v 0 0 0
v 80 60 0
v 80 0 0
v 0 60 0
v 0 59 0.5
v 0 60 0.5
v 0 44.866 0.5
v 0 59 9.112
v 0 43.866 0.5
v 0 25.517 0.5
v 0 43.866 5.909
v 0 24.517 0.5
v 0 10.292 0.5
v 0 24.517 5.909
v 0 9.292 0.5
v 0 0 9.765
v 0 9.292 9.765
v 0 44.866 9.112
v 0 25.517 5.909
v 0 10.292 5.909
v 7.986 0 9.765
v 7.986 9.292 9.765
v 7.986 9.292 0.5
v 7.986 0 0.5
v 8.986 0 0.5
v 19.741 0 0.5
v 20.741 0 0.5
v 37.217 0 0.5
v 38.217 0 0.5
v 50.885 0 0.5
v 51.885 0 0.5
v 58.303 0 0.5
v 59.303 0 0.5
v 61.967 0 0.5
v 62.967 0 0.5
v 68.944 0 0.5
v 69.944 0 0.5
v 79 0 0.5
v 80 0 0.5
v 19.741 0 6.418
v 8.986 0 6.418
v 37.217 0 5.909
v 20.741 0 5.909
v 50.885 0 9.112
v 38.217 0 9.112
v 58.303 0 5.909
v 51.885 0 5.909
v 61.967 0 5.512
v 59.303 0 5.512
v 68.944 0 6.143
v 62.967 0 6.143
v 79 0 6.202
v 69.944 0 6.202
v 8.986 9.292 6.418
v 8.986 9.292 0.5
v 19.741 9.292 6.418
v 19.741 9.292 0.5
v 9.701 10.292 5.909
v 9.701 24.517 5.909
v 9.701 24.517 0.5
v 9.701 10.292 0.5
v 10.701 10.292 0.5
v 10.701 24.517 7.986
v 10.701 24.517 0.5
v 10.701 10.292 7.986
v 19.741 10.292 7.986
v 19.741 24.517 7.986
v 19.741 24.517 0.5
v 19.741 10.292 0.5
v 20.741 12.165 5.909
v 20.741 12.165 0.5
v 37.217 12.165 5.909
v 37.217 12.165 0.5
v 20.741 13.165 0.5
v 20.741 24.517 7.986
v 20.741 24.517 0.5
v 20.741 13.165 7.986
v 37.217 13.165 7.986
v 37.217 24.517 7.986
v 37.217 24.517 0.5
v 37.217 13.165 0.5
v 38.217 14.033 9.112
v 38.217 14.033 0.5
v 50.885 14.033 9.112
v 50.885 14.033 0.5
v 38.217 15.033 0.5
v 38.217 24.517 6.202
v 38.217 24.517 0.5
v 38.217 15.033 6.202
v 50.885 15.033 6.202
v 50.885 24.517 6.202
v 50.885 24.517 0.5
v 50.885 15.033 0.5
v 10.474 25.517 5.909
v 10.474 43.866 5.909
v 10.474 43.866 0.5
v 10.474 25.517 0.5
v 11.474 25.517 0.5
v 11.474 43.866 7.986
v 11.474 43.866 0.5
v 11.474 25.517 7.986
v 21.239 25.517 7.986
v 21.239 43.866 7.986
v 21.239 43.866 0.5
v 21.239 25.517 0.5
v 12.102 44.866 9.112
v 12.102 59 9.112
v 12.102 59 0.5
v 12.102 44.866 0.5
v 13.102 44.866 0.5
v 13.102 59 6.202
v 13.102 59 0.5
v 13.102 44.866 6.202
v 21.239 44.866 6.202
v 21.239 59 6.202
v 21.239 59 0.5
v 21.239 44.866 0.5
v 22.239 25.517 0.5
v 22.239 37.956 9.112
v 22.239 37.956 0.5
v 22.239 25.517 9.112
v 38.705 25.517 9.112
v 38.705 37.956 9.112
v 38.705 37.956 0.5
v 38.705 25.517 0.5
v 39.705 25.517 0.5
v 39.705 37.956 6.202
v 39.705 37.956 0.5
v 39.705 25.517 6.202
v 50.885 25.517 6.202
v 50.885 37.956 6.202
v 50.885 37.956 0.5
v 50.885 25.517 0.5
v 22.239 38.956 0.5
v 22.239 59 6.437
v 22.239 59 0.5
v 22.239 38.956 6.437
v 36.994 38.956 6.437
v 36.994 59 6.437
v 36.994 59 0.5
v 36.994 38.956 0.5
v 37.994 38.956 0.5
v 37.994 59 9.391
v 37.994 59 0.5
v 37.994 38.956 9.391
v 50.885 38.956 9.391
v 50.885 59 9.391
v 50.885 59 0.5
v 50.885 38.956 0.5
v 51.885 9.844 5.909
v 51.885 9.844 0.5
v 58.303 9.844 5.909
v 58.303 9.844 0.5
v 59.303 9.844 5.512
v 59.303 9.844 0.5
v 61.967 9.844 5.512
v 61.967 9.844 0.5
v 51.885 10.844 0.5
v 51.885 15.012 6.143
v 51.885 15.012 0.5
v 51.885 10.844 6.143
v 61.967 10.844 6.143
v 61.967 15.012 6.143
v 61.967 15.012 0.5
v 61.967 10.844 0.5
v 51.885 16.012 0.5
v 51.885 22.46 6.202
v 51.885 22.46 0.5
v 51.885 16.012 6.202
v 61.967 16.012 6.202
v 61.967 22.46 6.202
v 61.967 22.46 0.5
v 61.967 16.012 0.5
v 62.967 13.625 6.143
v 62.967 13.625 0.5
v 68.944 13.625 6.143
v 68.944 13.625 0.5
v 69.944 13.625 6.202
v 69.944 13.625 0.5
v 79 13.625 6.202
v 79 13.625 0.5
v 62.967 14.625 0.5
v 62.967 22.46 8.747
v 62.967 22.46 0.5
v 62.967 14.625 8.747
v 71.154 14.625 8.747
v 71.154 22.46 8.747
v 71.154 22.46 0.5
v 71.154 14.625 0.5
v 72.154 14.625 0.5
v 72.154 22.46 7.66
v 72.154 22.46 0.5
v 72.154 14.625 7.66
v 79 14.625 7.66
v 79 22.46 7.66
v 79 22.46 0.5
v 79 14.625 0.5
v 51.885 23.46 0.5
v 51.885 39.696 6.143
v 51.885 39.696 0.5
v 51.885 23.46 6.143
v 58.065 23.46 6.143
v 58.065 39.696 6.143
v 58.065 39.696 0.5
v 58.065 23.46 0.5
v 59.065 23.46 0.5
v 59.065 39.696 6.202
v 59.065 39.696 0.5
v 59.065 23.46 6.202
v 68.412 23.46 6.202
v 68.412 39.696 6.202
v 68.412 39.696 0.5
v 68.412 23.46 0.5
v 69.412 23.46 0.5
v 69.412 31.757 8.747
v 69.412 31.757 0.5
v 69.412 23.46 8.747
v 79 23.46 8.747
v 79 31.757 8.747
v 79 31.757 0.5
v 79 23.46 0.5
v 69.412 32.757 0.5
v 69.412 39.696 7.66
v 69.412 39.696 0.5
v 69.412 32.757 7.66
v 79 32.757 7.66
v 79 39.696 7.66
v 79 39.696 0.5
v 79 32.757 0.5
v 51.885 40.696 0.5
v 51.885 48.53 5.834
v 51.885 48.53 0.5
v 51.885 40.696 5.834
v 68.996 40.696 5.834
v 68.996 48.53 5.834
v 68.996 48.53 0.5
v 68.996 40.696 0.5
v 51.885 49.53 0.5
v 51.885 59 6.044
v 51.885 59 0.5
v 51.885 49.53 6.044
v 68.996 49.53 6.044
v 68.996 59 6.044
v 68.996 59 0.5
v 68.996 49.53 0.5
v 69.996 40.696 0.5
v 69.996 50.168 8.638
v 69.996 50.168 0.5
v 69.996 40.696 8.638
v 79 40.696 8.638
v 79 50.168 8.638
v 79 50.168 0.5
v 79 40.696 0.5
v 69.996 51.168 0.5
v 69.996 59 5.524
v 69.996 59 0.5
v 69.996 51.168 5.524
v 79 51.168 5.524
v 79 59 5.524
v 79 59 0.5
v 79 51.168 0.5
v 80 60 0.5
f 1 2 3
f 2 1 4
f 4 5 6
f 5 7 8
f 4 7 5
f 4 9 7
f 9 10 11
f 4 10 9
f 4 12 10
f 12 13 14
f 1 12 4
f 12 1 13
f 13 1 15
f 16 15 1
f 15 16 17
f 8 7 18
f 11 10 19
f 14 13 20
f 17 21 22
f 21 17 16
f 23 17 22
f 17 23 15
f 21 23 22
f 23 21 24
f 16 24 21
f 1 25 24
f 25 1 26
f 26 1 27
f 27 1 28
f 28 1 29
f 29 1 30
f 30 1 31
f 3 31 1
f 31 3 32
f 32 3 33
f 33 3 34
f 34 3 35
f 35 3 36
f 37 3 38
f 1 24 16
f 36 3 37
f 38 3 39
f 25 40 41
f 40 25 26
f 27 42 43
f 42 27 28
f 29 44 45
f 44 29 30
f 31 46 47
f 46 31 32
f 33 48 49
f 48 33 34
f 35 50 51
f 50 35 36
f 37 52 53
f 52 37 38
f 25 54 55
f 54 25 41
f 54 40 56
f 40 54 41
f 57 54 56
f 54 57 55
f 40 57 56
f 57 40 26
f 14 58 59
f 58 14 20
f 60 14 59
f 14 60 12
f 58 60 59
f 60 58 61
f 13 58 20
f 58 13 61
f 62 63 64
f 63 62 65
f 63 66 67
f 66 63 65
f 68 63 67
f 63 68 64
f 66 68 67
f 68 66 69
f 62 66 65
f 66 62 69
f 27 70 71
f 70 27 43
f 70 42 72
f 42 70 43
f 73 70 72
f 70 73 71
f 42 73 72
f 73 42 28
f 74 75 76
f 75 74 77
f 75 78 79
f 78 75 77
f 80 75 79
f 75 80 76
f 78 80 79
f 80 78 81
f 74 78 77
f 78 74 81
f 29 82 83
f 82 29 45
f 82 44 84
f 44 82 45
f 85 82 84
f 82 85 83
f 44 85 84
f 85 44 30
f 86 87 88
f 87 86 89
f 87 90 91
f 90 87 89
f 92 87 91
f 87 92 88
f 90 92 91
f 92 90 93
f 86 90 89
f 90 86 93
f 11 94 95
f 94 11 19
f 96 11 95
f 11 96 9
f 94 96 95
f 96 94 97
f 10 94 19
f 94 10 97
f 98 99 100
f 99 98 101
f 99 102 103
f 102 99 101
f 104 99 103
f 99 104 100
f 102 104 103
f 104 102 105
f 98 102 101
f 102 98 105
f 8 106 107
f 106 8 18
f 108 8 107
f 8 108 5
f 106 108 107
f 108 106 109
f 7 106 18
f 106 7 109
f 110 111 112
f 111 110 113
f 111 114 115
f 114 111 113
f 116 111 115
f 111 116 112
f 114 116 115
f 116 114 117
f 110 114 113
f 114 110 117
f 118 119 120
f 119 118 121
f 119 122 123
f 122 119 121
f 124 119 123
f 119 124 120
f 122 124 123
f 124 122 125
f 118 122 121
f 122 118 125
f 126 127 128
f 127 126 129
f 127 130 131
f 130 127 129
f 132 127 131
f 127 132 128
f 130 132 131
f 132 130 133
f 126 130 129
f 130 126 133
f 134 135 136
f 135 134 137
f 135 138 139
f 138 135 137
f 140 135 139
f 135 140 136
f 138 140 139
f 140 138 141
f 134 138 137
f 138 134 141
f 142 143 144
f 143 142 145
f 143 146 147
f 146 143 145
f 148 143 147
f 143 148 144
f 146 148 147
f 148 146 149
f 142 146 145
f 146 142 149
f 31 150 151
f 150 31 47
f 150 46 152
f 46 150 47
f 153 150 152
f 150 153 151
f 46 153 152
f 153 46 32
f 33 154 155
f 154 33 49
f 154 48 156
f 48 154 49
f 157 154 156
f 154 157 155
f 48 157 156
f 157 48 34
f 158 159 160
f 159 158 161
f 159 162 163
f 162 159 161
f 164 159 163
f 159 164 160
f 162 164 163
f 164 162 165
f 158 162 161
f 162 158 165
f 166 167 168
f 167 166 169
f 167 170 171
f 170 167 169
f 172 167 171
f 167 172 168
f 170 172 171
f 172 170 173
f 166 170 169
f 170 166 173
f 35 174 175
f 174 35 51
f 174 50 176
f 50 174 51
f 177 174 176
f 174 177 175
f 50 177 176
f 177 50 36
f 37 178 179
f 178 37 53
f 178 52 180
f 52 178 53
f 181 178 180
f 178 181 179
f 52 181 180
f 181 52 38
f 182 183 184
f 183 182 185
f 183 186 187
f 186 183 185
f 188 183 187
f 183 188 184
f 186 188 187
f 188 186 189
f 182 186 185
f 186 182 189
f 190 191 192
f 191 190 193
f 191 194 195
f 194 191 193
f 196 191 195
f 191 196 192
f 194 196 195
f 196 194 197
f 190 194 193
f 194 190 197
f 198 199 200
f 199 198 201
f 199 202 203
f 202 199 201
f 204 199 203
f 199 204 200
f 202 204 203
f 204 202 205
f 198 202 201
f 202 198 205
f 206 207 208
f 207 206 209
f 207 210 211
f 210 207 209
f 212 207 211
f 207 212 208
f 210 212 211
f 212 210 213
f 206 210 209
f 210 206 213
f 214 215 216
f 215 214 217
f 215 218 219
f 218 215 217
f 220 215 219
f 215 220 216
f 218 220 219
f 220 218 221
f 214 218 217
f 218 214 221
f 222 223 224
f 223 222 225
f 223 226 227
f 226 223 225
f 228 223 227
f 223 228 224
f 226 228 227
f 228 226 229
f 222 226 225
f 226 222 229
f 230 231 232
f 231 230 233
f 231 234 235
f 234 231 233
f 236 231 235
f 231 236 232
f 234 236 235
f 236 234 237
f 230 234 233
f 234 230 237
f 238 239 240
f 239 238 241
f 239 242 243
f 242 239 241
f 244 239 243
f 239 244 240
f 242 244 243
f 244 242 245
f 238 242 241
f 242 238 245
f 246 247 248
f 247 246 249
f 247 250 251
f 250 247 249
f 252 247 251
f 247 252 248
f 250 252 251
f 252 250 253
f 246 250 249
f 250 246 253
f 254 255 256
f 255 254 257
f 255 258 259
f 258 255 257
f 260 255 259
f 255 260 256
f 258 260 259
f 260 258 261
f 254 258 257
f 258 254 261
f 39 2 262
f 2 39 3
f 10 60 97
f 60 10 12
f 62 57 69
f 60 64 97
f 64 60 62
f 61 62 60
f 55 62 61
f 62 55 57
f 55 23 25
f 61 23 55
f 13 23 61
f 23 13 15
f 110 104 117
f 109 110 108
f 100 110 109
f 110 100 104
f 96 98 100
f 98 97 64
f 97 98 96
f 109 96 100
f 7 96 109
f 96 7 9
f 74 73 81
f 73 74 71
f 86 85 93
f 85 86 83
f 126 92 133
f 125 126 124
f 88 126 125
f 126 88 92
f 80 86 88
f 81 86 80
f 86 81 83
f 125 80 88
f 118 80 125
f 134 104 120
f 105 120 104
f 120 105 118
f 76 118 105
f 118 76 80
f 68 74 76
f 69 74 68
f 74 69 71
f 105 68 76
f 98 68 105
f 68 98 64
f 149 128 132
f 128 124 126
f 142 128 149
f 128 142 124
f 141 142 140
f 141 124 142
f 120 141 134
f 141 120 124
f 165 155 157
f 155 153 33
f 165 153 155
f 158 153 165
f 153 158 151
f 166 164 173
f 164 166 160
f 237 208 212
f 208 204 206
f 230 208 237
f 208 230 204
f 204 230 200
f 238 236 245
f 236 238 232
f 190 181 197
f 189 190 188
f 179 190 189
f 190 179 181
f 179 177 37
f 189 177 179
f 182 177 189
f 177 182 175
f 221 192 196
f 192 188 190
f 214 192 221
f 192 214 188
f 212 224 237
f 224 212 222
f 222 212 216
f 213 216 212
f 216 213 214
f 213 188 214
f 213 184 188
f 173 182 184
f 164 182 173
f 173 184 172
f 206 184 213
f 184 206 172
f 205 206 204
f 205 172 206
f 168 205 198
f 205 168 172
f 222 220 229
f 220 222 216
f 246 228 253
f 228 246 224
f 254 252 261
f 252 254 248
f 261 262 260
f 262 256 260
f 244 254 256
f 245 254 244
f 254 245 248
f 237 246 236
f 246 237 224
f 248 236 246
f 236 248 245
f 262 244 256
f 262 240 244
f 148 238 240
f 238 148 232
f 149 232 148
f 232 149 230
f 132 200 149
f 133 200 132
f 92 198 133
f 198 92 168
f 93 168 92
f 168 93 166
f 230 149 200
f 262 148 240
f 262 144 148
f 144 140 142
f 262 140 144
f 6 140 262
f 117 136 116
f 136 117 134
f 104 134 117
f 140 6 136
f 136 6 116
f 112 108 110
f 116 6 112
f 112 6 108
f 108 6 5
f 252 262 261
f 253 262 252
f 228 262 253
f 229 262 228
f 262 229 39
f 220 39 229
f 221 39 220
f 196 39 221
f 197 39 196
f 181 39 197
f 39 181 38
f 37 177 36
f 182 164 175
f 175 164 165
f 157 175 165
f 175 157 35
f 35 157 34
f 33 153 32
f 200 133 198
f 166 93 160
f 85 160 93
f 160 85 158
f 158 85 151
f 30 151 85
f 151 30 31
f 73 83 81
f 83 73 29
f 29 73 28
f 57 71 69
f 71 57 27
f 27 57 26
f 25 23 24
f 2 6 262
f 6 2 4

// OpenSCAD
  // License: CC0 (aka CC Zero) - To the extent possible under law,
 // Ulrich Bär has waived all copyright and related or neighboring rights to this work.
// https://creativecommons.org/publicdomain/zero/1.0/

//https://en.wikipedia.org/wiki/Piet_Mondrian
seed=round(rands(0,9999,1)[0]);
echo(seed=seed);

Oblong(rec=4,size=[80,80*3/4],color=["white","Navy","white","red","white","gold","lightgrey","black","white"],border=[1,1],seed=seed);
color("black")cube([80,80*3/4,.5]);
text(str(seed),size=3,valign="top");
//Oblong(div=[1,1]*2,size=[841,1189],border=[1,1]*10);

module Oblong(rec=5,size=[50,50],border=[.5,1],div=[1.3,2.6],seed=41,h=[+5,10], minSize=7,color){

divR=rands(div[0],div[1],1,seed)[0];//[sqrt(2),1.618033];
borderR=rands(border[0],border[1],1,seed)[0];

case=size.x>size.y?1:0;


newA=case?[size.x/divR,size.y]:[size.x,size.y/divR];
newB=case?[size.x-newA.x,newA.y]:[newA.x,size.y-newA.y];

if(rec){ // recursive process
 Oblong(rec=min(size)-borderR>minSize?rec-1:0, size=newA, border=border, div=div, seed=seed*1.1, h=h, minSize=minSize,color=color);
 translate(case?[newA.x,0]:[0,newA.y])
  Oblong(rec=min(size)-borderR>minSize?rec-1:0, size=newB, border=border, div=div, seed=seed*1.2, h=h, minSize=minSize,color=color);
 }

if(!rec){ // only draw latest

cA=is_undef(color)?rands(0,1,3,seed*1.5):color[floor(rands(0,len(color)-.0001,1,seed*1.5)[0])];
cB=is_undef(color)?rands(0,1,3,seed*1.1):color[floor(rands(0,len(color)-.0001,1,seed*1.1)[0])];

color(cA)linear_extrude(rands(h[0],h[1],1,seed*1.6)[0])square(newA-borderR*[1,1]);
color(cB)translate(case?[newA.x,0]:[0,newA.y])linear_extrude(rands(h[0],h[1],1,seed*1.2)[0])square(newB-borderR*[1,1]);

}
}
